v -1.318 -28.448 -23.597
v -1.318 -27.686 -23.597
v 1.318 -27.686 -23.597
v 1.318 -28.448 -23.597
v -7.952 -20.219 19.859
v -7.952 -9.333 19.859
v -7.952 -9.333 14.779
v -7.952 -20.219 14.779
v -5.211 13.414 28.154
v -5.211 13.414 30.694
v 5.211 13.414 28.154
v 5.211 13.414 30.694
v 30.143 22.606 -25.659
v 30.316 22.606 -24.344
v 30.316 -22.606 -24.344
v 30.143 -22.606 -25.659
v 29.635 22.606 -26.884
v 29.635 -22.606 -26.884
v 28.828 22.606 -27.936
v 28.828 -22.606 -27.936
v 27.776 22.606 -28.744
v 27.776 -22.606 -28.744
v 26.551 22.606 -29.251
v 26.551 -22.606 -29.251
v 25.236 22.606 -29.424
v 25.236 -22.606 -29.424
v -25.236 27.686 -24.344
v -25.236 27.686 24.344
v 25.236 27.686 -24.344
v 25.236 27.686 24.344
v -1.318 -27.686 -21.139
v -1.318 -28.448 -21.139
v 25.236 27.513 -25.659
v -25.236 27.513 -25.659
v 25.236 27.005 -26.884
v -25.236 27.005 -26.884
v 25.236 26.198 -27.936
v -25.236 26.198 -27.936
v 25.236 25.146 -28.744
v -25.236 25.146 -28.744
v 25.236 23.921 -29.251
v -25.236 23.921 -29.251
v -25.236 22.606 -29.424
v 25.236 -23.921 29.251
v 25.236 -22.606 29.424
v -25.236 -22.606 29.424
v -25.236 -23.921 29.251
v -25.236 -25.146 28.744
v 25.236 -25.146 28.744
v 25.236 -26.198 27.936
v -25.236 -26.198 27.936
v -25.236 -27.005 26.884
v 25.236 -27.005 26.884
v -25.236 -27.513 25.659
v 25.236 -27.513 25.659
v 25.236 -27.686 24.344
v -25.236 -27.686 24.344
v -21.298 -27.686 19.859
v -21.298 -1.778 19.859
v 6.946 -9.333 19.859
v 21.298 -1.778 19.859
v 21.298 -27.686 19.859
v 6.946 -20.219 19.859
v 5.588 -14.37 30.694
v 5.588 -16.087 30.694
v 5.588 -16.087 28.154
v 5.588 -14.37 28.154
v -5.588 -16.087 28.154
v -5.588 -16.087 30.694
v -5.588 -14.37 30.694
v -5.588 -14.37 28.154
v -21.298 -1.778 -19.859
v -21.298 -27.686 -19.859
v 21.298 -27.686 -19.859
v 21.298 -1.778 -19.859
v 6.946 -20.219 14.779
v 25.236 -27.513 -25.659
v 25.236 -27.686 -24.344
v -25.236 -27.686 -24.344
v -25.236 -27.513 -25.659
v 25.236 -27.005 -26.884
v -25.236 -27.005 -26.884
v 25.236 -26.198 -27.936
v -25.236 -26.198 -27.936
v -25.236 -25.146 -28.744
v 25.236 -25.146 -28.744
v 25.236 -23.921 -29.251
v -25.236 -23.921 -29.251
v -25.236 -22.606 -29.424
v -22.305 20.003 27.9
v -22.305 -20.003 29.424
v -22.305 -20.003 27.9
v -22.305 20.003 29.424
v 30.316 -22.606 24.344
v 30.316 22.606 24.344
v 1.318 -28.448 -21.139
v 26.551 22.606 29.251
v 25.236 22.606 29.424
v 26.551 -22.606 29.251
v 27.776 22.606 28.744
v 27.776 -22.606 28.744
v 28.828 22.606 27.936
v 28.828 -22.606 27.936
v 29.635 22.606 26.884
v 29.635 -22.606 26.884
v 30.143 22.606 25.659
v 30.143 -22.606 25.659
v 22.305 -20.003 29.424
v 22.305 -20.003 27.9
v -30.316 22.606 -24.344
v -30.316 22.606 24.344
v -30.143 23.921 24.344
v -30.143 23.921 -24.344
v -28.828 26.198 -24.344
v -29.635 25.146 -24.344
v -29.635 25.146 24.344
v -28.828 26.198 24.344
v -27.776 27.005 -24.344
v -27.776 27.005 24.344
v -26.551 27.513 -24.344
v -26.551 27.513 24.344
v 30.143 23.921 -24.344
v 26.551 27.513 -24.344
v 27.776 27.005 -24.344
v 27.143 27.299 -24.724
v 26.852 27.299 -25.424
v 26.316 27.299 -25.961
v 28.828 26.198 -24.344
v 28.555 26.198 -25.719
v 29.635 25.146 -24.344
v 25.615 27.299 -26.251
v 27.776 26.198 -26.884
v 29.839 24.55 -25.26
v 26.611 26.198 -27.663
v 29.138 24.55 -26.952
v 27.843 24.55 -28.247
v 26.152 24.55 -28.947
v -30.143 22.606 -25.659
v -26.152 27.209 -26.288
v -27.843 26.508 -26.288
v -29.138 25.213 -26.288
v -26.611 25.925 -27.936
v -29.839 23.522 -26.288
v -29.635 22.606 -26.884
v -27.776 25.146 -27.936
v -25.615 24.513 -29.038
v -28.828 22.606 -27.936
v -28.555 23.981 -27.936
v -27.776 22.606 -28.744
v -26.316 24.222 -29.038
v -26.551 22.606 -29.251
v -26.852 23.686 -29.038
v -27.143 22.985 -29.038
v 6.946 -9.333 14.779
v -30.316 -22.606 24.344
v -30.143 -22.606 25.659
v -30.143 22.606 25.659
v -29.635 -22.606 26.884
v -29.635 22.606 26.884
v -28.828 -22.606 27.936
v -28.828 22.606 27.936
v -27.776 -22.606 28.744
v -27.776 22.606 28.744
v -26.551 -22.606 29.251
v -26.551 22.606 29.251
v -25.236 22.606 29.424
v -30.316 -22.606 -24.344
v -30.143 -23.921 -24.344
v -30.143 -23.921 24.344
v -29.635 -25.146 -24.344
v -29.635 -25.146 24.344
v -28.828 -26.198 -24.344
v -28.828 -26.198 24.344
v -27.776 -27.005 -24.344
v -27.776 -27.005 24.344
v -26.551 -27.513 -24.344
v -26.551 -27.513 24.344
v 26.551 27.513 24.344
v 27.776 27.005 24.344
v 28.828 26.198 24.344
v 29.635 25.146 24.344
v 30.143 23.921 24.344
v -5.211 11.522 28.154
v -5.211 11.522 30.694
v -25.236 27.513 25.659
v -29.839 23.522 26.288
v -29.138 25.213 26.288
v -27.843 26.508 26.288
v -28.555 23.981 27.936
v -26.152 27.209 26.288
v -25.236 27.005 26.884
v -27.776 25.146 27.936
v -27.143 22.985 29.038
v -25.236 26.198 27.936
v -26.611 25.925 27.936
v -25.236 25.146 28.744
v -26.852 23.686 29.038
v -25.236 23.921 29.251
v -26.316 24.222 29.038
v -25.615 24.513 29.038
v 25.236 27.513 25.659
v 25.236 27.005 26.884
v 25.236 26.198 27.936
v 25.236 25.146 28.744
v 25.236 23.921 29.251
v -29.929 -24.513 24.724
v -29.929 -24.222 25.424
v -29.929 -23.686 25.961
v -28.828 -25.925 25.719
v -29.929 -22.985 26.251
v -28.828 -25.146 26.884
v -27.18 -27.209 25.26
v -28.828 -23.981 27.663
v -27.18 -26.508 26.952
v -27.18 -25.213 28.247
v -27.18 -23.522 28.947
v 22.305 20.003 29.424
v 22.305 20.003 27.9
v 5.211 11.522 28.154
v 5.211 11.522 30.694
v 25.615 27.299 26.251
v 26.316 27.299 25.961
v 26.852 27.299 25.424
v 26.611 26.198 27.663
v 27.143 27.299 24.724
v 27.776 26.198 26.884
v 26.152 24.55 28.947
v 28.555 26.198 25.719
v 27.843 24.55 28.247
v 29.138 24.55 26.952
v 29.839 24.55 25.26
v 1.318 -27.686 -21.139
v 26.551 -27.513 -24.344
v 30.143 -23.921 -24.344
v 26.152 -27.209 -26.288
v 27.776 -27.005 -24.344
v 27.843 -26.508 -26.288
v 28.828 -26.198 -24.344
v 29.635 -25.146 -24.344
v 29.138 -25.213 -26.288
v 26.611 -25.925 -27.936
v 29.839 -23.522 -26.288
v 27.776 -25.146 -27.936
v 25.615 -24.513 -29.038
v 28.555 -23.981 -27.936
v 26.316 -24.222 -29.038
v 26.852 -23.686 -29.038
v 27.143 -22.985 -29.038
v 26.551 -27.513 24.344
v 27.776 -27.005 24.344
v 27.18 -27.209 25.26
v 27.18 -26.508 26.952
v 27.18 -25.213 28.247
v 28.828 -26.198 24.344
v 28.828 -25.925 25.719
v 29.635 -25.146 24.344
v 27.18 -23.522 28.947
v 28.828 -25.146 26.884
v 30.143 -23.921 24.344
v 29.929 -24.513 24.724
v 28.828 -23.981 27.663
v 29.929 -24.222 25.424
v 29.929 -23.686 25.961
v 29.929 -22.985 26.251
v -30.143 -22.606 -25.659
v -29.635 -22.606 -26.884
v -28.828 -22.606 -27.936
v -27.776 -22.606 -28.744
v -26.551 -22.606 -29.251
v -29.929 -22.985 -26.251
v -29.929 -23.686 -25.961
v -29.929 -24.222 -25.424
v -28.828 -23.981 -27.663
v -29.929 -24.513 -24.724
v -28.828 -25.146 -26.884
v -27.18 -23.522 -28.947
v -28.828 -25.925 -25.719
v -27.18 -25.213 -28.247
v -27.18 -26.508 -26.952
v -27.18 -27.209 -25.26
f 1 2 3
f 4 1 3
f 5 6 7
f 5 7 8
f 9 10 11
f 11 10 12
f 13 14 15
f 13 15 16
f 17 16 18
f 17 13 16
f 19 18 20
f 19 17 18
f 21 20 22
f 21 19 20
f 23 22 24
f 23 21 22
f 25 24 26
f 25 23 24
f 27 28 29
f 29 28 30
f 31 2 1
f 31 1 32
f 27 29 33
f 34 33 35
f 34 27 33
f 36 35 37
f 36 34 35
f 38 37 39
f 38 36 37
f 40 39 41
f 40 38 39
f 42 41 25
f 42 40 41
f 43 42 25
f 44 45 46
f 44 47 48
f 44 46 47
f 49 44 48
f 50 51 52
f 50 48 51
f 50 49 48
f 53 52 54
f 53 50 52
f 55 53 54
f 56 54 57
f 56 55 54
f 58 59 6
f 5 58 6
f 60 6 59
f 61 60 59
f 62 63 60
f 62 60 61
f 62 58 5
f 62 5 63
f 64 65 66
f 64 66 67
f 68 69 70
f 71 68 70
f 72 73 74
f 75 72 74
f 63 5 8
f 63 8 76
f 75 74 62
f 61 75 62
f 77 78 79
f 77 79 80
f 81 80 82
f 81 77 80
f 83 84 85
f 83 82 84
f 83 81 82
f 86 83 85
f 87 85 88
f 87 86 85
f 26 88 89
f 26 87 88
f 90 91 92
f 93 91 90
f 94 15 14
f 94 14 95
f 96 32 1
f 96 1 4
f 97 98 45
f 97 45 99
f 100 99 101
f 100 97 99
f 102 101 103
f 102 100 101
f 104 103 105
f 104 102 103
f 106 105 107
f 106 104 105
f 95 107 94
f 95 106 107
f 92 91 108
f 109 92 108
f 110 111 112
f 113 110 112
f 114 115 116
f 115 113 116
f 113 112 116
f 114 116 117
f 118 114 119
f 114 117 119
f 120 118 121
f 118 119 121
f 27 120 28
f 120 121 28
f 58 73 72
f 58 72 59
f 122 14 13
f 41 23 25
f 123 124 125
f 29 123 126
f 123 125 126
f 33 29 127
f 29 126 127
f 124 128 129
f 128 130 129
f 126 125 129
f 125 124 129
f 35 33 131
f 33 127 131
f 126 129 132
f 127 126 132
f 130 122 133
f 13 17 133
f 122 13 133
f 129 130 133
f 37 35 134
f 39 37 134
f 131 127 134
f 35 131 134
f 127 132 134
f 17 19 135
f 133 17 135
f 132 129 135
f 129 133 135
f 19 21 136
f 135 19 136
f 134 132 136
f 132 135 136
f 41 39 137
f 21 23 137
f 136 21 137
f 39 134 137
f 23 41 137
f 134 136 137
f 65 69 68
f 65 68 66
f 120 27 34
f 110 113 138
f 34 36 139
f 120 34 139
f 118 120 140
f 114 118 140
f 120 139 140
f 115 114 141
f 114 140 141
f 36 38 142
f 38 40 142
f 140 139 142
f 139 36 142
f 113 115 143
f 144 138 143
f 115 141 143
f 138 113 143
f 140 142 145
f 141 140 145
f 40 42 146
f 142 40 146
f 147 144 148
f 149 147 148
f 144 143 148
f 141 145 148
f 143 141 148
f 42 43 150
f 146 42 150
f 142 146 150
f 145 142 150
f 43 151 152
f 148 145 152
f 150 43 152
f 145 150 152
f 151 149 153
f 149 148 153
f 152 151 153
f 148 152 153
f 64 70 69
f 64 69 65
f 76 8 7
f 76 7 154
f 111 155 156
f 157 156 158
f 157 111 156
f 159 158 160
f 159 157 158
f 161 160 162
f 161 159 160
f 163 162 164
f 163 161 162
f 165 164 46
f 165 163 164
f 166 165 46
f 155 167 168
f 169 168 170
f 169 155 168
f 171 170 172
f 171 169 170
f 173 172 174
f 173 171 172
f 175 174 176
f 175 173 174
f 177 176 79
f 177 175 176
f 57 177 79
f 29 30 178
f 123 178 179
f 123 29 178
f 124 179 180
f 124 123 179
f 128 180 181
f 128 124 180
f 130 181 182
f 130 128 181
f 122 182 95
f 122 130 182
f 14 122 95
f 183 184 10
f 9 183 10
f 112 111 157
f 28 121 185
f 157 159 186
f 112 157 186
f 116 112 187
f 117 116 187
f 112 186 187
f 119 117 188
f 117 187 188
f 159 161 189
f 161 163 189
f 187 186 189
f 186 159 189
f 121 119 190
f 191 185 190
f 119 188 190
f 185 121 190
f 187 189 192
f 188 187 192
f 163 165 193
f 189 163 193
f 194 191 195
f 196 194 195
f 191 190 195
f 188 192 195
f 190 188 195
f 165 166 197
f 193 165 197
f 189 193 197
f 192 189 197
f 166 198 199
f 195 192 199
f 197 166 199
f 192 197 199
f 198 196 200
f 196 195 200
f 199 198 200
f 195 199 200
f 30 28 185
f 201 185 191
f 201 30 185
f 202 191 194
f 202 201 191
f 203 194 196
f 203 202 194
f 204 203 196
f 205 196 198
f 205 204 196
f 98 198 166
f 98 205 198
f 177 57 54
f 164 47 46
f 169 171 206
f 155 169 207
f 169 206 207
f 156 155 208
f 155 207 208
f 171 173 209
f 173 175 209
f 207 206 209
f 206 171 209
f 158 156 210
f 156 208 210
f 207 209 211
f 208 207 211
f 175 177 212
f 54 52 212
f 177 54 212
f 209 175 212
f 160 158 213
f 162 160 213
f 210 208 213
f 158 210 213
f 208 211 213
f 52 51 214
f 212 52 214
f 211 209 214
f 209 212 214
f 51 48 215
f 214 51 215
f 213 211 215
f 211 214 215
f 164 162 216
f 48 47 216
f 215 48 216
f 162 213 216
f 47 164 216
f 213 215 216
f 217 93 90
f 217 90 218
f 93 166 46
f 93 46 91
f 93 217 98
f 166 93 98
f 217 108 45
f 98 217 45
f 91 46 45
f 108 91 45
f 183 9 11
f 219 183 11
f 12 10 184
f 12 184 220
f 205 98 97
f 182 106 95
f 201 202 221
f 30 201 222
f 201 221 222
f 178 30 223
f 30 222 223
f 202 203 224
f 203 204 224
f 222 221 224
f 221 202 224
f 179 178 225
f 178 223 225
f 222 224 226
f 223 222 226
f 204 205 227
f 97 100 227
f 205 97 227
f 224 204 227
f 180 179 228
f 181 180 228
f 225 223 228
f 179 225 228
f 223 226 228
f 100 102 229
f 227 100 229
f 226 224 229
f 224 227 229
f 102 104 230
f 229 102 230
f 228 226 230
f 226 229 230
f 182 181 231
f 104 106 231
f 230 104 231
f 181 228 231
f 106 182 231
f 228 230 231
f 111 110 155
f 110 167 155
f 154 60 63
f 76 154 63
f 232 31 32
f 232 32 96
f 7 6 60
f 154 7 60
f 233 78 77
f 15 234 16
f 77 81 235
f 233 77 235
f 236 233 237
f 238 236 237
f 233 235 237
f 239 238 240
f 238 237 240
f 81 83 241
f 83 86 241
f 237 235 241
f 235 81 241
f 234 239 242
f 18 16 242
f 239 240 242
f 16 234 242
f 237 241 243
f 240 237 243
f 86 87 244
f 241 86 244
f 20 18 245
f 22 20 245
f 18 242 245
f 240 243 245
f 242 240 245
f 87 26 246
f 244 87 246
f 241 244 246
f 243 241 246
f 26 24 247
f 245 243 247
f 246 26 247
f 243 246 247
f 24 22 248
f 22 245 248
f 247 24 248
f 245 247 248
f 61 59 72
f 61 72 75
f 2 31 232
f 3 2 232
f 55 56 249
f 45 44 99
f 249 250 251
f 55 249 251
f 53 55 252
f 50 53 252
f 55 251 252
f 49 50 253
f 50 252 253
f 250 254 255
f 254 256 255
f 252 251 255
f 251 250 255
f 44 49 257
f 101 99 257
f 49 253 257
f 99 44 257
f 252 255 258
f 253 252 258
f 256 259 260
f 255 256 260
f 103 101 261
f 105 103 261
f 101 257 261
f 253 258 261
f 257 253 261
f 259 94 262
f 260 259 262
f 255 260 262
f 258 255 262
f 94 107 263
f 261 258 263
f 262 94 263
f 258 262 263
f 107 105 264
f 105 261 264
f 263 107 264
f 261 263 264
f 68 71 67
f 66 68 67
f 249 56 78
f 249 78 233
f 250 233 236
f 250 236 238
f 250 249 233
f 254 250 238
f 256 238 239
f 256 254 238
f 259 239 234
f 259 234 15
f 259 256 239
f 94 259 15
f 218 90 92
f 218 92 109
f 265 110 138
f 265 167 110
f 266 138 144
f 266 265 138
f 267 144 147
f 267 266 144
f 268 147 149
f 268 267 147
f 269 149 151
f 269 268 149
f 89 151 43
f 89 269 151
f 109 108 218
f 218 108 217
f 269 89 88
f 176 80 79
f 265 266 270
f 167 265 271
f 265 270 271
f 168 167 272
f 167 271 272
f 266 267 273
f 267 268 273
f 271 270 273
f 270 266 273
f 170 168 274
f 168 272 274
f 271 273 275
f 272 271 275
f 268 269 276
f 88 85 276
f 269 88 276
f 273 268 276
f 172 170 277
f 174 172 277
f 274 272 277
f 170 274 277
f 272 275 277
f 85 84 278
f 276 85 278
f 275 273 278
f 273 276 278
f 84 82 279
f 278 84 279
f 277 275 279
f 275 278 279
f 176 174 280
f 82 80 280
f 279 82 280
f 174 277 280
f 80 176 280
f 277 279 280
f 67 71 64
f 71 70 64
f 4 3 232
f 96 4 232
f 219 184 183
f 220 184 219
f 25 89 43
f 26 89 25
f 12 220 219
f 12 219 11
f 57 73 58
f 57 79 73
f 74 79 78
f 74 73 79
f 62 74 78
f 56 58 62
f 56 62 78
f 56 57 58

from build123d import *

# Parameters (mm, degrees)
F0_W      = 60.631816
F0_H      = 58.848508
F1_DEPTH  = 27.686
F2_W      = 42.595248
F2_H      = 39.717198
F3_DEPTH  = 25.908
F4_R      = 5.08
F5_R      = 5.08
F6_R      = 5.08
F7_R      = 5.08
F8_R      = 5.08
F9_W      = 14.898214
F9_H      = 10.885901
F10_DEPTH = 5.08
F11_W     = 44.609894
F11_H     = 40.005002
F13_DEPTH = 1.524
F14_W     = 11.176974
F14_H     = 1.716889
F15_DEPTH = 1.27
F16_W     = 10.421328
F16_H     = 1.891898
F17_DEPTH = 1.27
F18_W     = 2.635458
F18_H     = 2.458126
F19_DEPTH = 0.762


with BuildPart() as f1:
    # F0 (on Front) → F1 (new body, symmetric)
    with BuildSketch(Plane.XZ):
        Rectangle(F0_W, F0_H)
    extrude(amount=F1_DEPTH, both=True)

    # F2 (on face) → F3 (cut, symmetric)
    with BuildSketch(Plane.XZ.offset(27.686)):
        Rectangle(F2_W, F2_H)
    extrude(amount=F3_DEPTH, both=True, mode=Mode.SUBTRACT)

    # F4
    f4_edges = [f1.edges().sort_by_distance(p)[0] for p in [
        (0, -27.686, 29.424254),
    ]]
    fillet(f4_edges, radius=F4_R)

    # F5
    f5_edges = [f1.edges().sort_by_distance(p)[0] for p in [
        (30.315908, 2.54, 29.424254),
    ]]
    fillet(f5_edges, radius=F5_R)

    # F6
    f6_edges = [f1.edges().sort_by_distance(p)[0] for p in [
        (-2.54, -27.686, -29.424254),
    ]]
    fillet(f6_edges, radius=F6_R)

    # F7
    f7_edges = [f1.edges().sort_by_distance(p)[0] for p in [
        (-30.315908, 27.686, 0),
    ]]
    fillet(f7_edges, radius=F7_R)

    # F8
    f8_edges = [f1.edges().sort_by_distance(p)[0] for p in [
        (-30.315908, 0, -29.424254),
    ]]
    fillet(f8_edges, radius=F8_R)

    # F9 (on face) → F10 (join)
    with BuildSketch(Plane(origin=(0, 0, 19.858599), x_dir=(1, 0, 0), z_dir=(0, 0, -1))):
        with Locations((-0.502687, 14.775745)):
            Rectangle(F9_W, F9_H)
    extrude(amount=F10_DEPTH)

    # F11 (on face) → F13 (cut, symmetric)
    with BuildSketch(Plane.XY.offset(29.424254)):
        Rectangle(F11_W, F11_H)
    extrude(amount=F13_DEPTH, both=True, mode=Mode.SUBTRACT)


with BuildPart() as f15:
    # F14 (on face) → F15 (new body, symmetric)
    with BuildSketch(Plane.XY.offset(29.424254)):
        with Locations((0, -15.228529)):
            Rectangle(F14_W, F14_H)
    extrude(amount=F15_DEPTH, both=True)


with BuildPart() as f17:
    # F16 (on face) → F17 (new body, symmetric)
    with BuildSketch(Plane.XY.offset(29.424254)):
        with Locations((0, 12.468232)):
            Rectangle(F16_W, F16_H)
    extrude(amount=F17_DEPTH, both=True)


with BuildPart() as f19:
    # F18 (on face) → F19 (new body)
    with BuildSketch(Plane.XZ.offset(27.686)):
        with Locations((0, -22.367768)):
            Rectangle(F18_W, F18_H)
    extrude(amount=F19_DEPTH)


solid = Compound([f1.part, f15.part, f17.part, f19.part])
